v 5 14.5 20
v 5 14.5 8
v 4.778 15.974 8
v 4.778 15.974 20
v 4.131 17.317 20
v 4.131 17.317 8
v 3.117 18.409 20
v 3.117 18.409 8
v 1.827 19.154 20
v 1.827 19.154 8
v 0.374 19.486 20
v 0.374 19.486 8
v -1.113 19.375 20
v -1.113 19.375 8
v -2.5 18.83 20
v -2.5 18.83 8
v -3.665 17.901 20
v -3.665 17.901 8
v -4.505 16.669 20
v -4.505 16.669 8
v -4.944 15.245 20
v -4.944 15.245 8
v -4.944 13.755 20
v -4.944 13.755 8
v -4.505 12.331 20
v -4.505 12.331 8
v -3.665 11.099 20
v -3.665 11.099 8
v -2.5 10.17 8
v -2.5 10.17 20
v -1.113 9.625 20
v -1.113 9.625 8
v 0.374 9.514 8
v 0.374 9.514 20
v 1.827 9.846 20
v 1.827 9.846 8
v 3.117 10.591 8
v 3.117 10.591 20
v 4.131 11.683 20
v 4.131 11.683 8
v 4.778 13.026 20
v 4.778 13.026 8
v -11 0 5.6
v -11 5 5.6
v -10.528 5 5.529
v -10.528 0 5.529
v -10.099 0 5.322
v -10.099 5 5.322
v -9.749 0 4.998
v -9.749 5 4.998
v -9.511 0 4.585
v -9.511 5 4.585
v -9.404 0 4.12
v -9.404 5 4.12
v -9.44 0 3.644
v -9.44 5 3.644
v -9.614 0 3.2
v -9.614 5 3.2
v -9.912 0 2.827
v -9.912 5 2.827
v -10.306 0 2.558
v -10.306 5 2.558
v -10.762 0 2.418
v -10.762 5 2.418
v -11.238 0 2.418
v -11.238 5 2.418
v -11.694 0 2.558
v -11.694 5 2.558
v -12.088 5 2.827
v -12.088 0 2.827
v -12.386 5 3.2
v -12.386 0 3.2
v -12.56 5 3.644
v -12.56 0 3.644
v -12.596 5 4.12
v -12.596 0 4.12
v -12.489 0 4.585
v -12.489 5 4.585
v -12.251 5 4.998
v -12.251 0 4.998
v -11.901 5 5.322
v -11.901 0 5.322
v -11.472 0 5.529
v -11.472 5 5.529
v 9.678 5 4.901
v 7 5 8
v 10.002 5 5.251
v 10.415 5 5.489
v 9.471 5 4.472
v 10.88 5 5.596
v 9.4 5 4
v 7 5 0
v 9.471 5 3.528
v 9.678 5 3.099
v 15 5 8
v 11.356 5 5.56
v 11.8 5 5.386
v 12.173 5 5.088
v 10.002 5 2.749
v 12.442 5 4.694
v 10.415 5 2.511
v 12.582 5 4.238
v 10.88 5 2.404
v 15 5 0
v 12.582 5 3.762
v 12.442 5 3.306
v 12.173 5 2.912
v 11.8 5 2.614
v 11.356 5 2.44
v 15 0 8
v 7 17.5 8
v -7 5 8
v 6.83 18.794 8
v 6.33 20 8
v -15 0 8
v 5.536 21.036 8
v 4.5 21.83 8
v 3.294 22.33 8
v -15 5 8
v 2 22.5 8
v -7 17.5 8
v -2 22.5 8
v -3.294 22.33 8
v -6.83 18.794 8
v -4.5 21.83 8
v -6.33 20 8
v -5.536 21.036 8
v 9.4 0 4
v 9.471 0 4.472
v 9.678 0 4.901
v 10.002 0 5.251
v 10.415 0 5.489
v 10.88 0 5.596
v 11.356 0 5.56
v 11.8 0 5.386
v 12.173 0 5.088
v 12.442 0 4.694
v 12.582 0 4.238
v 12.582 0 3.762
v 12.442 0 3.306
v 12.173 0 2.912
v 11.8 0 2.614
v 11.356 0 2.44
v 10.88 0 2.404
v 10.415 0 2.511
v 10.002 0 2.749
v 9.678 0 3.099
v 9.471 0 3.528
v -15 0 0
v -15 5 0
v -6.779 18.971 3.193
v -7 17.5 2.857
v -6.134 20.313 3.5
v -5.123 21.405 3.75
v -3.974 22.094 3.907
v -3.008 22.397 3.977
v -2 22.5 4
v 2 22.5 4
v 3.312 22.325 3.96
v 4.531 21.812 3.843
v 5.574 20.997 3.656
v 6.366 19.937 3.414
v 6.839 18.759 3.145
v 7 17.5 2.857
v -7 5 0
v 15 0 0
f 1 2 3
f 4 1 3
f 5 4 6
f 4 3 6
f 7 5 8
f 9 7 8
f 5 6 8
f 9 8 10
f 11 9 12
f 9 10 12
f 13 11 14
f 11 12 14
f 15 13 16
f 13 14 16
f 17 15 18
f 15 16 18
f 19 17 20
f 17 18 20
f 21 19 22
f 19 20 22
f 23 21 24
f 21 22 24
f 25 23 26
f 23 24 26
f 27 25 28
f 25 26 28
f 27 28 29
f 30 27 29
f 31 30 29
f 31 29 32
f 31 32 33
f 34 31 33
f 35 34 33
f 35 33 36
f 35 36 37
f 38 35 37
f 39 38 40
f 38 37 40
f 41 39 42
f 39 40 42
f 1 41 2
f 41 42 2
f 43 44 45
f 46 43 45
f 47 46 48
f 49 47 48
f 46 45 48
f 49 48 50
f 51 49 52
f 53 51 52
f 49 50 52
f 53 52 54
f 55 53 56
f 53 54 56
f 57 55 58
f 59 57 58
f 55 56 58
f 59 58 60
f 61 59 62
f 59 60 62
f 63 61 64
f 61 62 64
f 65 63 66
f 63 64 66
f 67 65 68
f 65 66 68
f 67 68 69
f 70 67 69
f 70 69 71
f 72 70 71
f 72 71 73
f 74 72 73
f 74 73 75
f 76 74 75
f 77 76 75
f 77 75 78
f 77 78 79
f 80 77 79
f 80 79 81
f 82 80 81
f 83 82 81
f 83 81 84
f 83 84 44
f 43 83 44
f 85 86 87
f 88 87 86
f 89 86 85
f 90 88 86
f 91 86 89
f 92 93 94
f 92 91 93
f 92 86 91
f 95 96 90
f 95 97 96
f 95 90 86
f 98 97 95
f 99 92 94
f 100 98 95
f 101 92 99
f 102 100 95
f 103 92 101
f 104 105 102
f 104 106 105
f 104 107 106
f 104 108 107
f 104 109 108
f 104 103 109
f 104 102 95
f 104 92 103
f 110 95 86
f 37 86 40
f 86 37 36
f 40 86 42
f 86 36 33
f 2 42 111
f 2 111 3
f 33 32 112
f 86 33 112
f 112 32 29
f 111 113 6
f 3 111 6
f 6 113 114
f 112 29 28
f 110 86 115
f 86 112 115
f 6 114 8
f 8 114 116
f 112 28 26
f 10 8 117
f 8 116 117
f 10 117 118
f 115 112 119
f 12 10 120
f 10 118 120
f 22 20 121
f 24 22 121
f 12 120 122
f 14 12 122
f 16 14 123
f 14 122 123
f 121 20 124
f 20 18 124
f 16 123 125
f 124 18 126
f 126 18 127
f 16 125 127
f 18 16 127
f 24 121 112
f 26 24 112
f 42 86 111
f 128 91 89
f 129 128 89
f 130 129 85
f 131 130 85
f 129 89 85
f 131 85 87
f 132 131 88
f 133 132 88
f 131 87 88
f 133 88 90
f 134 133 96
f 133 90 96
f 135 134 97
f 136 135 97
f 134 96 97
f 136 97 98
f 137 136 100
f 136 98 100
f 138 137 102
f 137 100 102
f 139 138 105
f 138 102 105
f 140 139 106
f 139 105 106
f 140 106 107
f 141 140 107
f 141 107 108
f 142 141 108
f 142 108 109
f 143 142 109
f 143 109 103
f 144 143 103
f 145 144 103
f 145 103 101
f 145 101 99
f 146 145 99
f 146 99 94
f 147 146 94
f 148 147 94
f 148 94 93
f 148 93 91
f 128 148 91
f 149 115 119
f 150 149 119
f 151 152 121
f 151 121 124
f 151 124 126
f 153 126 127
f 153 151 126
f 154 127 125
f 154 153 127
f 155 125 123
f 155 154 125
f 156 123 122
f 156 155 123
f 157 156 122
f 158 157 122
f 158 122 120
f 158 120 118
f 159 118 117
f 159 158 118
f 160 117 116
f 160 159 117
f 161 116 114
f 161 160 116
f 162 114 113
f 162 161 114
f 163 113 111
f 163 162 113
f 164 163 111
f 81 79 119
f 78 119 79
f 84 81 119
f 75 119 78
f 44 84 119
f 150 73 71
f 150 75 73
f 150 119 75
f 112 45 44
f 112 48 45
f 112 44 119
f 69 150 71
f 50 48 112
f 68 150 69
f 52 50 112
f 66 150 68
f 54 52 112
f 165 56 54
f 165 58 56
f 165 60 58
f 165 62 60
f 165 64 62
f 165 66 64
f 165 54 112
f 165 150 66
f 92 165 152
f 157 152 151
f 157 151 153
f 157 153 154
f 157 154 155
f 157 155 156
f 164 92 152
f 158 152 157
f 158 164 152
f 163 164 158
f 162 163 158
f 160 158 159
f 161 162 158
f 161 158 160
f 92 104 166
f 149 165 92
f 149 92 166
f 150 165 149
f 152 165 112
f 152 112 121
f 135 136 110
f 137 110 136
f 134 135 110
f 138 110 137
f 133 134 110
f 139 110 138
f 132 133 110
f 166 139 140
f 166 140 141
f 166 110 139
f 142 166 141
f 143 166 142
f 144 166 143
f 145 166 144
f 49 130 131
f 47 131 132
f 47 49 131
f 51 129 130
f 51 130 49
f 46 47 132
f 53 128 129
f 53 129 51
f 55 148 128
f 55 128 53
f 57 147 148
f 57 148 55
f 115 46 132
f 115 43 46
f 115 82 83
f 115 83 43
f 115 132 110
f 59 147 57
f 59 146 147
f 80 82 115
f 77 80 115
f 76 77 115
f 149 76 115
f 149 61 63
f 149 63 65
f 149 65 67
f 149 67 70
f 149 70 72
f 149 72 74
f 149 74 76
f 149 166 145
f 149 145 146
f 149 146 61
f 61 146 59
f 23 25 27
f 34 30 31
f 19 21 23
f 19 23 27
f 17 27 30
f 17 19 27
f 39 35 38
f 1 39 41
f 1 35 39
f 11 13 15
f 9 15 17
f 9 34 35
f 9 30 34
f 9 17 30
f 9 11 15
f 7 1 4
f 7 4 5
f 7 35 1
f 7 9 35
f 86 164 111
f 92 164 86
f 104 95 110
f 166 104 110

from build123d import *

# Parameters (mm, degrees)
BOSS_EXTRUDE2_DEPTH     = 8
SKETCH2_R               = 1.6
CUT_EXTRUDE1_DEPTH      = 8
SKETCH3_R               = 5
BOSS_EXTRUDE3_DEPTH     = 12
CUT_EXTRUDE3_DEPTH      = 43.5
CUT_EXTRUDE3_DEPTH_BACK = 43.5


with BuildPart() as part:
    # Sketch1 → Boss-Extrude2 (new body)
    with BuildSketch(Plane.XY):
        with BuildLine():
            Line((0, 0), (-15, 0))
            Line((-15, 0), (-15, 5))
            Line((-15, 5), (-7, 5))
            Line((-7, 5), (-7, 17.5))
            ThreePointArc((-7, 17.5), (-5.535533906, 21.035533906), (-2, 22.5))
            Line((-2, 22.5), (2, 22.5))
            ThreePointArc((2, 22.5), (5.535533906, 21.035533906), (7, 17.5))
            Line((7, 17.5), (7, 5))
            Line((7, 5), (15, 5))
            Line((15, 5), (15, 0))
            Line((15, 0), (0, 0))
        make_face()
    extrude(amount=BOSS_EXTRUDE2_DEPTH)

    # Sketch2 → Cut-Extrude1 (cut)
    with BuildSketch(Plane(origin=(0, 5, 0), x_dir=(1, 0, 0), z_dir=(0, 1, 0))):
        with Locations((-11, -4)):
            Circle(SKETCH2_R)
        with Locations((11, -4)):
            Circle(SKETCH2_R)
    extrude(amount=-CUT_EXTRUDE1_DEPTH, mode=Mode.SUBTRACT)

    # Sketch3 → Boss-Extrude3 (add)
    with BuildSketch(Plane.XY.offset(8)):
        with Locations((0, 14.5)):
            Circle(SKETCH3_R)
    extrude(amount=BOSS_EXTRUDE3_DEPTH)

    # Sketch8 → Cut-Extrude3 (cut, two sides: drawn at the far end of the back side and taken through both)
    with BuildSketch(Plane.ZY.offset(15).offset(-CUT_EXTRUDE3_DEPTH_BACK)):
        Polygon((-14.53213237, -58.578079117), (0, 5), (4, 22.5), (18.53213237, 86.078079117), (-108.624025864, 115.142343856), (-141.688290603, -29.513814378), align=None)
    extrude(amount=CUT_EXTRUDE3_DEPTH + CUT_EXTRUDE3_DEPTH_BACK, mode=Mode.SUBTRACT)


solid = part.part
